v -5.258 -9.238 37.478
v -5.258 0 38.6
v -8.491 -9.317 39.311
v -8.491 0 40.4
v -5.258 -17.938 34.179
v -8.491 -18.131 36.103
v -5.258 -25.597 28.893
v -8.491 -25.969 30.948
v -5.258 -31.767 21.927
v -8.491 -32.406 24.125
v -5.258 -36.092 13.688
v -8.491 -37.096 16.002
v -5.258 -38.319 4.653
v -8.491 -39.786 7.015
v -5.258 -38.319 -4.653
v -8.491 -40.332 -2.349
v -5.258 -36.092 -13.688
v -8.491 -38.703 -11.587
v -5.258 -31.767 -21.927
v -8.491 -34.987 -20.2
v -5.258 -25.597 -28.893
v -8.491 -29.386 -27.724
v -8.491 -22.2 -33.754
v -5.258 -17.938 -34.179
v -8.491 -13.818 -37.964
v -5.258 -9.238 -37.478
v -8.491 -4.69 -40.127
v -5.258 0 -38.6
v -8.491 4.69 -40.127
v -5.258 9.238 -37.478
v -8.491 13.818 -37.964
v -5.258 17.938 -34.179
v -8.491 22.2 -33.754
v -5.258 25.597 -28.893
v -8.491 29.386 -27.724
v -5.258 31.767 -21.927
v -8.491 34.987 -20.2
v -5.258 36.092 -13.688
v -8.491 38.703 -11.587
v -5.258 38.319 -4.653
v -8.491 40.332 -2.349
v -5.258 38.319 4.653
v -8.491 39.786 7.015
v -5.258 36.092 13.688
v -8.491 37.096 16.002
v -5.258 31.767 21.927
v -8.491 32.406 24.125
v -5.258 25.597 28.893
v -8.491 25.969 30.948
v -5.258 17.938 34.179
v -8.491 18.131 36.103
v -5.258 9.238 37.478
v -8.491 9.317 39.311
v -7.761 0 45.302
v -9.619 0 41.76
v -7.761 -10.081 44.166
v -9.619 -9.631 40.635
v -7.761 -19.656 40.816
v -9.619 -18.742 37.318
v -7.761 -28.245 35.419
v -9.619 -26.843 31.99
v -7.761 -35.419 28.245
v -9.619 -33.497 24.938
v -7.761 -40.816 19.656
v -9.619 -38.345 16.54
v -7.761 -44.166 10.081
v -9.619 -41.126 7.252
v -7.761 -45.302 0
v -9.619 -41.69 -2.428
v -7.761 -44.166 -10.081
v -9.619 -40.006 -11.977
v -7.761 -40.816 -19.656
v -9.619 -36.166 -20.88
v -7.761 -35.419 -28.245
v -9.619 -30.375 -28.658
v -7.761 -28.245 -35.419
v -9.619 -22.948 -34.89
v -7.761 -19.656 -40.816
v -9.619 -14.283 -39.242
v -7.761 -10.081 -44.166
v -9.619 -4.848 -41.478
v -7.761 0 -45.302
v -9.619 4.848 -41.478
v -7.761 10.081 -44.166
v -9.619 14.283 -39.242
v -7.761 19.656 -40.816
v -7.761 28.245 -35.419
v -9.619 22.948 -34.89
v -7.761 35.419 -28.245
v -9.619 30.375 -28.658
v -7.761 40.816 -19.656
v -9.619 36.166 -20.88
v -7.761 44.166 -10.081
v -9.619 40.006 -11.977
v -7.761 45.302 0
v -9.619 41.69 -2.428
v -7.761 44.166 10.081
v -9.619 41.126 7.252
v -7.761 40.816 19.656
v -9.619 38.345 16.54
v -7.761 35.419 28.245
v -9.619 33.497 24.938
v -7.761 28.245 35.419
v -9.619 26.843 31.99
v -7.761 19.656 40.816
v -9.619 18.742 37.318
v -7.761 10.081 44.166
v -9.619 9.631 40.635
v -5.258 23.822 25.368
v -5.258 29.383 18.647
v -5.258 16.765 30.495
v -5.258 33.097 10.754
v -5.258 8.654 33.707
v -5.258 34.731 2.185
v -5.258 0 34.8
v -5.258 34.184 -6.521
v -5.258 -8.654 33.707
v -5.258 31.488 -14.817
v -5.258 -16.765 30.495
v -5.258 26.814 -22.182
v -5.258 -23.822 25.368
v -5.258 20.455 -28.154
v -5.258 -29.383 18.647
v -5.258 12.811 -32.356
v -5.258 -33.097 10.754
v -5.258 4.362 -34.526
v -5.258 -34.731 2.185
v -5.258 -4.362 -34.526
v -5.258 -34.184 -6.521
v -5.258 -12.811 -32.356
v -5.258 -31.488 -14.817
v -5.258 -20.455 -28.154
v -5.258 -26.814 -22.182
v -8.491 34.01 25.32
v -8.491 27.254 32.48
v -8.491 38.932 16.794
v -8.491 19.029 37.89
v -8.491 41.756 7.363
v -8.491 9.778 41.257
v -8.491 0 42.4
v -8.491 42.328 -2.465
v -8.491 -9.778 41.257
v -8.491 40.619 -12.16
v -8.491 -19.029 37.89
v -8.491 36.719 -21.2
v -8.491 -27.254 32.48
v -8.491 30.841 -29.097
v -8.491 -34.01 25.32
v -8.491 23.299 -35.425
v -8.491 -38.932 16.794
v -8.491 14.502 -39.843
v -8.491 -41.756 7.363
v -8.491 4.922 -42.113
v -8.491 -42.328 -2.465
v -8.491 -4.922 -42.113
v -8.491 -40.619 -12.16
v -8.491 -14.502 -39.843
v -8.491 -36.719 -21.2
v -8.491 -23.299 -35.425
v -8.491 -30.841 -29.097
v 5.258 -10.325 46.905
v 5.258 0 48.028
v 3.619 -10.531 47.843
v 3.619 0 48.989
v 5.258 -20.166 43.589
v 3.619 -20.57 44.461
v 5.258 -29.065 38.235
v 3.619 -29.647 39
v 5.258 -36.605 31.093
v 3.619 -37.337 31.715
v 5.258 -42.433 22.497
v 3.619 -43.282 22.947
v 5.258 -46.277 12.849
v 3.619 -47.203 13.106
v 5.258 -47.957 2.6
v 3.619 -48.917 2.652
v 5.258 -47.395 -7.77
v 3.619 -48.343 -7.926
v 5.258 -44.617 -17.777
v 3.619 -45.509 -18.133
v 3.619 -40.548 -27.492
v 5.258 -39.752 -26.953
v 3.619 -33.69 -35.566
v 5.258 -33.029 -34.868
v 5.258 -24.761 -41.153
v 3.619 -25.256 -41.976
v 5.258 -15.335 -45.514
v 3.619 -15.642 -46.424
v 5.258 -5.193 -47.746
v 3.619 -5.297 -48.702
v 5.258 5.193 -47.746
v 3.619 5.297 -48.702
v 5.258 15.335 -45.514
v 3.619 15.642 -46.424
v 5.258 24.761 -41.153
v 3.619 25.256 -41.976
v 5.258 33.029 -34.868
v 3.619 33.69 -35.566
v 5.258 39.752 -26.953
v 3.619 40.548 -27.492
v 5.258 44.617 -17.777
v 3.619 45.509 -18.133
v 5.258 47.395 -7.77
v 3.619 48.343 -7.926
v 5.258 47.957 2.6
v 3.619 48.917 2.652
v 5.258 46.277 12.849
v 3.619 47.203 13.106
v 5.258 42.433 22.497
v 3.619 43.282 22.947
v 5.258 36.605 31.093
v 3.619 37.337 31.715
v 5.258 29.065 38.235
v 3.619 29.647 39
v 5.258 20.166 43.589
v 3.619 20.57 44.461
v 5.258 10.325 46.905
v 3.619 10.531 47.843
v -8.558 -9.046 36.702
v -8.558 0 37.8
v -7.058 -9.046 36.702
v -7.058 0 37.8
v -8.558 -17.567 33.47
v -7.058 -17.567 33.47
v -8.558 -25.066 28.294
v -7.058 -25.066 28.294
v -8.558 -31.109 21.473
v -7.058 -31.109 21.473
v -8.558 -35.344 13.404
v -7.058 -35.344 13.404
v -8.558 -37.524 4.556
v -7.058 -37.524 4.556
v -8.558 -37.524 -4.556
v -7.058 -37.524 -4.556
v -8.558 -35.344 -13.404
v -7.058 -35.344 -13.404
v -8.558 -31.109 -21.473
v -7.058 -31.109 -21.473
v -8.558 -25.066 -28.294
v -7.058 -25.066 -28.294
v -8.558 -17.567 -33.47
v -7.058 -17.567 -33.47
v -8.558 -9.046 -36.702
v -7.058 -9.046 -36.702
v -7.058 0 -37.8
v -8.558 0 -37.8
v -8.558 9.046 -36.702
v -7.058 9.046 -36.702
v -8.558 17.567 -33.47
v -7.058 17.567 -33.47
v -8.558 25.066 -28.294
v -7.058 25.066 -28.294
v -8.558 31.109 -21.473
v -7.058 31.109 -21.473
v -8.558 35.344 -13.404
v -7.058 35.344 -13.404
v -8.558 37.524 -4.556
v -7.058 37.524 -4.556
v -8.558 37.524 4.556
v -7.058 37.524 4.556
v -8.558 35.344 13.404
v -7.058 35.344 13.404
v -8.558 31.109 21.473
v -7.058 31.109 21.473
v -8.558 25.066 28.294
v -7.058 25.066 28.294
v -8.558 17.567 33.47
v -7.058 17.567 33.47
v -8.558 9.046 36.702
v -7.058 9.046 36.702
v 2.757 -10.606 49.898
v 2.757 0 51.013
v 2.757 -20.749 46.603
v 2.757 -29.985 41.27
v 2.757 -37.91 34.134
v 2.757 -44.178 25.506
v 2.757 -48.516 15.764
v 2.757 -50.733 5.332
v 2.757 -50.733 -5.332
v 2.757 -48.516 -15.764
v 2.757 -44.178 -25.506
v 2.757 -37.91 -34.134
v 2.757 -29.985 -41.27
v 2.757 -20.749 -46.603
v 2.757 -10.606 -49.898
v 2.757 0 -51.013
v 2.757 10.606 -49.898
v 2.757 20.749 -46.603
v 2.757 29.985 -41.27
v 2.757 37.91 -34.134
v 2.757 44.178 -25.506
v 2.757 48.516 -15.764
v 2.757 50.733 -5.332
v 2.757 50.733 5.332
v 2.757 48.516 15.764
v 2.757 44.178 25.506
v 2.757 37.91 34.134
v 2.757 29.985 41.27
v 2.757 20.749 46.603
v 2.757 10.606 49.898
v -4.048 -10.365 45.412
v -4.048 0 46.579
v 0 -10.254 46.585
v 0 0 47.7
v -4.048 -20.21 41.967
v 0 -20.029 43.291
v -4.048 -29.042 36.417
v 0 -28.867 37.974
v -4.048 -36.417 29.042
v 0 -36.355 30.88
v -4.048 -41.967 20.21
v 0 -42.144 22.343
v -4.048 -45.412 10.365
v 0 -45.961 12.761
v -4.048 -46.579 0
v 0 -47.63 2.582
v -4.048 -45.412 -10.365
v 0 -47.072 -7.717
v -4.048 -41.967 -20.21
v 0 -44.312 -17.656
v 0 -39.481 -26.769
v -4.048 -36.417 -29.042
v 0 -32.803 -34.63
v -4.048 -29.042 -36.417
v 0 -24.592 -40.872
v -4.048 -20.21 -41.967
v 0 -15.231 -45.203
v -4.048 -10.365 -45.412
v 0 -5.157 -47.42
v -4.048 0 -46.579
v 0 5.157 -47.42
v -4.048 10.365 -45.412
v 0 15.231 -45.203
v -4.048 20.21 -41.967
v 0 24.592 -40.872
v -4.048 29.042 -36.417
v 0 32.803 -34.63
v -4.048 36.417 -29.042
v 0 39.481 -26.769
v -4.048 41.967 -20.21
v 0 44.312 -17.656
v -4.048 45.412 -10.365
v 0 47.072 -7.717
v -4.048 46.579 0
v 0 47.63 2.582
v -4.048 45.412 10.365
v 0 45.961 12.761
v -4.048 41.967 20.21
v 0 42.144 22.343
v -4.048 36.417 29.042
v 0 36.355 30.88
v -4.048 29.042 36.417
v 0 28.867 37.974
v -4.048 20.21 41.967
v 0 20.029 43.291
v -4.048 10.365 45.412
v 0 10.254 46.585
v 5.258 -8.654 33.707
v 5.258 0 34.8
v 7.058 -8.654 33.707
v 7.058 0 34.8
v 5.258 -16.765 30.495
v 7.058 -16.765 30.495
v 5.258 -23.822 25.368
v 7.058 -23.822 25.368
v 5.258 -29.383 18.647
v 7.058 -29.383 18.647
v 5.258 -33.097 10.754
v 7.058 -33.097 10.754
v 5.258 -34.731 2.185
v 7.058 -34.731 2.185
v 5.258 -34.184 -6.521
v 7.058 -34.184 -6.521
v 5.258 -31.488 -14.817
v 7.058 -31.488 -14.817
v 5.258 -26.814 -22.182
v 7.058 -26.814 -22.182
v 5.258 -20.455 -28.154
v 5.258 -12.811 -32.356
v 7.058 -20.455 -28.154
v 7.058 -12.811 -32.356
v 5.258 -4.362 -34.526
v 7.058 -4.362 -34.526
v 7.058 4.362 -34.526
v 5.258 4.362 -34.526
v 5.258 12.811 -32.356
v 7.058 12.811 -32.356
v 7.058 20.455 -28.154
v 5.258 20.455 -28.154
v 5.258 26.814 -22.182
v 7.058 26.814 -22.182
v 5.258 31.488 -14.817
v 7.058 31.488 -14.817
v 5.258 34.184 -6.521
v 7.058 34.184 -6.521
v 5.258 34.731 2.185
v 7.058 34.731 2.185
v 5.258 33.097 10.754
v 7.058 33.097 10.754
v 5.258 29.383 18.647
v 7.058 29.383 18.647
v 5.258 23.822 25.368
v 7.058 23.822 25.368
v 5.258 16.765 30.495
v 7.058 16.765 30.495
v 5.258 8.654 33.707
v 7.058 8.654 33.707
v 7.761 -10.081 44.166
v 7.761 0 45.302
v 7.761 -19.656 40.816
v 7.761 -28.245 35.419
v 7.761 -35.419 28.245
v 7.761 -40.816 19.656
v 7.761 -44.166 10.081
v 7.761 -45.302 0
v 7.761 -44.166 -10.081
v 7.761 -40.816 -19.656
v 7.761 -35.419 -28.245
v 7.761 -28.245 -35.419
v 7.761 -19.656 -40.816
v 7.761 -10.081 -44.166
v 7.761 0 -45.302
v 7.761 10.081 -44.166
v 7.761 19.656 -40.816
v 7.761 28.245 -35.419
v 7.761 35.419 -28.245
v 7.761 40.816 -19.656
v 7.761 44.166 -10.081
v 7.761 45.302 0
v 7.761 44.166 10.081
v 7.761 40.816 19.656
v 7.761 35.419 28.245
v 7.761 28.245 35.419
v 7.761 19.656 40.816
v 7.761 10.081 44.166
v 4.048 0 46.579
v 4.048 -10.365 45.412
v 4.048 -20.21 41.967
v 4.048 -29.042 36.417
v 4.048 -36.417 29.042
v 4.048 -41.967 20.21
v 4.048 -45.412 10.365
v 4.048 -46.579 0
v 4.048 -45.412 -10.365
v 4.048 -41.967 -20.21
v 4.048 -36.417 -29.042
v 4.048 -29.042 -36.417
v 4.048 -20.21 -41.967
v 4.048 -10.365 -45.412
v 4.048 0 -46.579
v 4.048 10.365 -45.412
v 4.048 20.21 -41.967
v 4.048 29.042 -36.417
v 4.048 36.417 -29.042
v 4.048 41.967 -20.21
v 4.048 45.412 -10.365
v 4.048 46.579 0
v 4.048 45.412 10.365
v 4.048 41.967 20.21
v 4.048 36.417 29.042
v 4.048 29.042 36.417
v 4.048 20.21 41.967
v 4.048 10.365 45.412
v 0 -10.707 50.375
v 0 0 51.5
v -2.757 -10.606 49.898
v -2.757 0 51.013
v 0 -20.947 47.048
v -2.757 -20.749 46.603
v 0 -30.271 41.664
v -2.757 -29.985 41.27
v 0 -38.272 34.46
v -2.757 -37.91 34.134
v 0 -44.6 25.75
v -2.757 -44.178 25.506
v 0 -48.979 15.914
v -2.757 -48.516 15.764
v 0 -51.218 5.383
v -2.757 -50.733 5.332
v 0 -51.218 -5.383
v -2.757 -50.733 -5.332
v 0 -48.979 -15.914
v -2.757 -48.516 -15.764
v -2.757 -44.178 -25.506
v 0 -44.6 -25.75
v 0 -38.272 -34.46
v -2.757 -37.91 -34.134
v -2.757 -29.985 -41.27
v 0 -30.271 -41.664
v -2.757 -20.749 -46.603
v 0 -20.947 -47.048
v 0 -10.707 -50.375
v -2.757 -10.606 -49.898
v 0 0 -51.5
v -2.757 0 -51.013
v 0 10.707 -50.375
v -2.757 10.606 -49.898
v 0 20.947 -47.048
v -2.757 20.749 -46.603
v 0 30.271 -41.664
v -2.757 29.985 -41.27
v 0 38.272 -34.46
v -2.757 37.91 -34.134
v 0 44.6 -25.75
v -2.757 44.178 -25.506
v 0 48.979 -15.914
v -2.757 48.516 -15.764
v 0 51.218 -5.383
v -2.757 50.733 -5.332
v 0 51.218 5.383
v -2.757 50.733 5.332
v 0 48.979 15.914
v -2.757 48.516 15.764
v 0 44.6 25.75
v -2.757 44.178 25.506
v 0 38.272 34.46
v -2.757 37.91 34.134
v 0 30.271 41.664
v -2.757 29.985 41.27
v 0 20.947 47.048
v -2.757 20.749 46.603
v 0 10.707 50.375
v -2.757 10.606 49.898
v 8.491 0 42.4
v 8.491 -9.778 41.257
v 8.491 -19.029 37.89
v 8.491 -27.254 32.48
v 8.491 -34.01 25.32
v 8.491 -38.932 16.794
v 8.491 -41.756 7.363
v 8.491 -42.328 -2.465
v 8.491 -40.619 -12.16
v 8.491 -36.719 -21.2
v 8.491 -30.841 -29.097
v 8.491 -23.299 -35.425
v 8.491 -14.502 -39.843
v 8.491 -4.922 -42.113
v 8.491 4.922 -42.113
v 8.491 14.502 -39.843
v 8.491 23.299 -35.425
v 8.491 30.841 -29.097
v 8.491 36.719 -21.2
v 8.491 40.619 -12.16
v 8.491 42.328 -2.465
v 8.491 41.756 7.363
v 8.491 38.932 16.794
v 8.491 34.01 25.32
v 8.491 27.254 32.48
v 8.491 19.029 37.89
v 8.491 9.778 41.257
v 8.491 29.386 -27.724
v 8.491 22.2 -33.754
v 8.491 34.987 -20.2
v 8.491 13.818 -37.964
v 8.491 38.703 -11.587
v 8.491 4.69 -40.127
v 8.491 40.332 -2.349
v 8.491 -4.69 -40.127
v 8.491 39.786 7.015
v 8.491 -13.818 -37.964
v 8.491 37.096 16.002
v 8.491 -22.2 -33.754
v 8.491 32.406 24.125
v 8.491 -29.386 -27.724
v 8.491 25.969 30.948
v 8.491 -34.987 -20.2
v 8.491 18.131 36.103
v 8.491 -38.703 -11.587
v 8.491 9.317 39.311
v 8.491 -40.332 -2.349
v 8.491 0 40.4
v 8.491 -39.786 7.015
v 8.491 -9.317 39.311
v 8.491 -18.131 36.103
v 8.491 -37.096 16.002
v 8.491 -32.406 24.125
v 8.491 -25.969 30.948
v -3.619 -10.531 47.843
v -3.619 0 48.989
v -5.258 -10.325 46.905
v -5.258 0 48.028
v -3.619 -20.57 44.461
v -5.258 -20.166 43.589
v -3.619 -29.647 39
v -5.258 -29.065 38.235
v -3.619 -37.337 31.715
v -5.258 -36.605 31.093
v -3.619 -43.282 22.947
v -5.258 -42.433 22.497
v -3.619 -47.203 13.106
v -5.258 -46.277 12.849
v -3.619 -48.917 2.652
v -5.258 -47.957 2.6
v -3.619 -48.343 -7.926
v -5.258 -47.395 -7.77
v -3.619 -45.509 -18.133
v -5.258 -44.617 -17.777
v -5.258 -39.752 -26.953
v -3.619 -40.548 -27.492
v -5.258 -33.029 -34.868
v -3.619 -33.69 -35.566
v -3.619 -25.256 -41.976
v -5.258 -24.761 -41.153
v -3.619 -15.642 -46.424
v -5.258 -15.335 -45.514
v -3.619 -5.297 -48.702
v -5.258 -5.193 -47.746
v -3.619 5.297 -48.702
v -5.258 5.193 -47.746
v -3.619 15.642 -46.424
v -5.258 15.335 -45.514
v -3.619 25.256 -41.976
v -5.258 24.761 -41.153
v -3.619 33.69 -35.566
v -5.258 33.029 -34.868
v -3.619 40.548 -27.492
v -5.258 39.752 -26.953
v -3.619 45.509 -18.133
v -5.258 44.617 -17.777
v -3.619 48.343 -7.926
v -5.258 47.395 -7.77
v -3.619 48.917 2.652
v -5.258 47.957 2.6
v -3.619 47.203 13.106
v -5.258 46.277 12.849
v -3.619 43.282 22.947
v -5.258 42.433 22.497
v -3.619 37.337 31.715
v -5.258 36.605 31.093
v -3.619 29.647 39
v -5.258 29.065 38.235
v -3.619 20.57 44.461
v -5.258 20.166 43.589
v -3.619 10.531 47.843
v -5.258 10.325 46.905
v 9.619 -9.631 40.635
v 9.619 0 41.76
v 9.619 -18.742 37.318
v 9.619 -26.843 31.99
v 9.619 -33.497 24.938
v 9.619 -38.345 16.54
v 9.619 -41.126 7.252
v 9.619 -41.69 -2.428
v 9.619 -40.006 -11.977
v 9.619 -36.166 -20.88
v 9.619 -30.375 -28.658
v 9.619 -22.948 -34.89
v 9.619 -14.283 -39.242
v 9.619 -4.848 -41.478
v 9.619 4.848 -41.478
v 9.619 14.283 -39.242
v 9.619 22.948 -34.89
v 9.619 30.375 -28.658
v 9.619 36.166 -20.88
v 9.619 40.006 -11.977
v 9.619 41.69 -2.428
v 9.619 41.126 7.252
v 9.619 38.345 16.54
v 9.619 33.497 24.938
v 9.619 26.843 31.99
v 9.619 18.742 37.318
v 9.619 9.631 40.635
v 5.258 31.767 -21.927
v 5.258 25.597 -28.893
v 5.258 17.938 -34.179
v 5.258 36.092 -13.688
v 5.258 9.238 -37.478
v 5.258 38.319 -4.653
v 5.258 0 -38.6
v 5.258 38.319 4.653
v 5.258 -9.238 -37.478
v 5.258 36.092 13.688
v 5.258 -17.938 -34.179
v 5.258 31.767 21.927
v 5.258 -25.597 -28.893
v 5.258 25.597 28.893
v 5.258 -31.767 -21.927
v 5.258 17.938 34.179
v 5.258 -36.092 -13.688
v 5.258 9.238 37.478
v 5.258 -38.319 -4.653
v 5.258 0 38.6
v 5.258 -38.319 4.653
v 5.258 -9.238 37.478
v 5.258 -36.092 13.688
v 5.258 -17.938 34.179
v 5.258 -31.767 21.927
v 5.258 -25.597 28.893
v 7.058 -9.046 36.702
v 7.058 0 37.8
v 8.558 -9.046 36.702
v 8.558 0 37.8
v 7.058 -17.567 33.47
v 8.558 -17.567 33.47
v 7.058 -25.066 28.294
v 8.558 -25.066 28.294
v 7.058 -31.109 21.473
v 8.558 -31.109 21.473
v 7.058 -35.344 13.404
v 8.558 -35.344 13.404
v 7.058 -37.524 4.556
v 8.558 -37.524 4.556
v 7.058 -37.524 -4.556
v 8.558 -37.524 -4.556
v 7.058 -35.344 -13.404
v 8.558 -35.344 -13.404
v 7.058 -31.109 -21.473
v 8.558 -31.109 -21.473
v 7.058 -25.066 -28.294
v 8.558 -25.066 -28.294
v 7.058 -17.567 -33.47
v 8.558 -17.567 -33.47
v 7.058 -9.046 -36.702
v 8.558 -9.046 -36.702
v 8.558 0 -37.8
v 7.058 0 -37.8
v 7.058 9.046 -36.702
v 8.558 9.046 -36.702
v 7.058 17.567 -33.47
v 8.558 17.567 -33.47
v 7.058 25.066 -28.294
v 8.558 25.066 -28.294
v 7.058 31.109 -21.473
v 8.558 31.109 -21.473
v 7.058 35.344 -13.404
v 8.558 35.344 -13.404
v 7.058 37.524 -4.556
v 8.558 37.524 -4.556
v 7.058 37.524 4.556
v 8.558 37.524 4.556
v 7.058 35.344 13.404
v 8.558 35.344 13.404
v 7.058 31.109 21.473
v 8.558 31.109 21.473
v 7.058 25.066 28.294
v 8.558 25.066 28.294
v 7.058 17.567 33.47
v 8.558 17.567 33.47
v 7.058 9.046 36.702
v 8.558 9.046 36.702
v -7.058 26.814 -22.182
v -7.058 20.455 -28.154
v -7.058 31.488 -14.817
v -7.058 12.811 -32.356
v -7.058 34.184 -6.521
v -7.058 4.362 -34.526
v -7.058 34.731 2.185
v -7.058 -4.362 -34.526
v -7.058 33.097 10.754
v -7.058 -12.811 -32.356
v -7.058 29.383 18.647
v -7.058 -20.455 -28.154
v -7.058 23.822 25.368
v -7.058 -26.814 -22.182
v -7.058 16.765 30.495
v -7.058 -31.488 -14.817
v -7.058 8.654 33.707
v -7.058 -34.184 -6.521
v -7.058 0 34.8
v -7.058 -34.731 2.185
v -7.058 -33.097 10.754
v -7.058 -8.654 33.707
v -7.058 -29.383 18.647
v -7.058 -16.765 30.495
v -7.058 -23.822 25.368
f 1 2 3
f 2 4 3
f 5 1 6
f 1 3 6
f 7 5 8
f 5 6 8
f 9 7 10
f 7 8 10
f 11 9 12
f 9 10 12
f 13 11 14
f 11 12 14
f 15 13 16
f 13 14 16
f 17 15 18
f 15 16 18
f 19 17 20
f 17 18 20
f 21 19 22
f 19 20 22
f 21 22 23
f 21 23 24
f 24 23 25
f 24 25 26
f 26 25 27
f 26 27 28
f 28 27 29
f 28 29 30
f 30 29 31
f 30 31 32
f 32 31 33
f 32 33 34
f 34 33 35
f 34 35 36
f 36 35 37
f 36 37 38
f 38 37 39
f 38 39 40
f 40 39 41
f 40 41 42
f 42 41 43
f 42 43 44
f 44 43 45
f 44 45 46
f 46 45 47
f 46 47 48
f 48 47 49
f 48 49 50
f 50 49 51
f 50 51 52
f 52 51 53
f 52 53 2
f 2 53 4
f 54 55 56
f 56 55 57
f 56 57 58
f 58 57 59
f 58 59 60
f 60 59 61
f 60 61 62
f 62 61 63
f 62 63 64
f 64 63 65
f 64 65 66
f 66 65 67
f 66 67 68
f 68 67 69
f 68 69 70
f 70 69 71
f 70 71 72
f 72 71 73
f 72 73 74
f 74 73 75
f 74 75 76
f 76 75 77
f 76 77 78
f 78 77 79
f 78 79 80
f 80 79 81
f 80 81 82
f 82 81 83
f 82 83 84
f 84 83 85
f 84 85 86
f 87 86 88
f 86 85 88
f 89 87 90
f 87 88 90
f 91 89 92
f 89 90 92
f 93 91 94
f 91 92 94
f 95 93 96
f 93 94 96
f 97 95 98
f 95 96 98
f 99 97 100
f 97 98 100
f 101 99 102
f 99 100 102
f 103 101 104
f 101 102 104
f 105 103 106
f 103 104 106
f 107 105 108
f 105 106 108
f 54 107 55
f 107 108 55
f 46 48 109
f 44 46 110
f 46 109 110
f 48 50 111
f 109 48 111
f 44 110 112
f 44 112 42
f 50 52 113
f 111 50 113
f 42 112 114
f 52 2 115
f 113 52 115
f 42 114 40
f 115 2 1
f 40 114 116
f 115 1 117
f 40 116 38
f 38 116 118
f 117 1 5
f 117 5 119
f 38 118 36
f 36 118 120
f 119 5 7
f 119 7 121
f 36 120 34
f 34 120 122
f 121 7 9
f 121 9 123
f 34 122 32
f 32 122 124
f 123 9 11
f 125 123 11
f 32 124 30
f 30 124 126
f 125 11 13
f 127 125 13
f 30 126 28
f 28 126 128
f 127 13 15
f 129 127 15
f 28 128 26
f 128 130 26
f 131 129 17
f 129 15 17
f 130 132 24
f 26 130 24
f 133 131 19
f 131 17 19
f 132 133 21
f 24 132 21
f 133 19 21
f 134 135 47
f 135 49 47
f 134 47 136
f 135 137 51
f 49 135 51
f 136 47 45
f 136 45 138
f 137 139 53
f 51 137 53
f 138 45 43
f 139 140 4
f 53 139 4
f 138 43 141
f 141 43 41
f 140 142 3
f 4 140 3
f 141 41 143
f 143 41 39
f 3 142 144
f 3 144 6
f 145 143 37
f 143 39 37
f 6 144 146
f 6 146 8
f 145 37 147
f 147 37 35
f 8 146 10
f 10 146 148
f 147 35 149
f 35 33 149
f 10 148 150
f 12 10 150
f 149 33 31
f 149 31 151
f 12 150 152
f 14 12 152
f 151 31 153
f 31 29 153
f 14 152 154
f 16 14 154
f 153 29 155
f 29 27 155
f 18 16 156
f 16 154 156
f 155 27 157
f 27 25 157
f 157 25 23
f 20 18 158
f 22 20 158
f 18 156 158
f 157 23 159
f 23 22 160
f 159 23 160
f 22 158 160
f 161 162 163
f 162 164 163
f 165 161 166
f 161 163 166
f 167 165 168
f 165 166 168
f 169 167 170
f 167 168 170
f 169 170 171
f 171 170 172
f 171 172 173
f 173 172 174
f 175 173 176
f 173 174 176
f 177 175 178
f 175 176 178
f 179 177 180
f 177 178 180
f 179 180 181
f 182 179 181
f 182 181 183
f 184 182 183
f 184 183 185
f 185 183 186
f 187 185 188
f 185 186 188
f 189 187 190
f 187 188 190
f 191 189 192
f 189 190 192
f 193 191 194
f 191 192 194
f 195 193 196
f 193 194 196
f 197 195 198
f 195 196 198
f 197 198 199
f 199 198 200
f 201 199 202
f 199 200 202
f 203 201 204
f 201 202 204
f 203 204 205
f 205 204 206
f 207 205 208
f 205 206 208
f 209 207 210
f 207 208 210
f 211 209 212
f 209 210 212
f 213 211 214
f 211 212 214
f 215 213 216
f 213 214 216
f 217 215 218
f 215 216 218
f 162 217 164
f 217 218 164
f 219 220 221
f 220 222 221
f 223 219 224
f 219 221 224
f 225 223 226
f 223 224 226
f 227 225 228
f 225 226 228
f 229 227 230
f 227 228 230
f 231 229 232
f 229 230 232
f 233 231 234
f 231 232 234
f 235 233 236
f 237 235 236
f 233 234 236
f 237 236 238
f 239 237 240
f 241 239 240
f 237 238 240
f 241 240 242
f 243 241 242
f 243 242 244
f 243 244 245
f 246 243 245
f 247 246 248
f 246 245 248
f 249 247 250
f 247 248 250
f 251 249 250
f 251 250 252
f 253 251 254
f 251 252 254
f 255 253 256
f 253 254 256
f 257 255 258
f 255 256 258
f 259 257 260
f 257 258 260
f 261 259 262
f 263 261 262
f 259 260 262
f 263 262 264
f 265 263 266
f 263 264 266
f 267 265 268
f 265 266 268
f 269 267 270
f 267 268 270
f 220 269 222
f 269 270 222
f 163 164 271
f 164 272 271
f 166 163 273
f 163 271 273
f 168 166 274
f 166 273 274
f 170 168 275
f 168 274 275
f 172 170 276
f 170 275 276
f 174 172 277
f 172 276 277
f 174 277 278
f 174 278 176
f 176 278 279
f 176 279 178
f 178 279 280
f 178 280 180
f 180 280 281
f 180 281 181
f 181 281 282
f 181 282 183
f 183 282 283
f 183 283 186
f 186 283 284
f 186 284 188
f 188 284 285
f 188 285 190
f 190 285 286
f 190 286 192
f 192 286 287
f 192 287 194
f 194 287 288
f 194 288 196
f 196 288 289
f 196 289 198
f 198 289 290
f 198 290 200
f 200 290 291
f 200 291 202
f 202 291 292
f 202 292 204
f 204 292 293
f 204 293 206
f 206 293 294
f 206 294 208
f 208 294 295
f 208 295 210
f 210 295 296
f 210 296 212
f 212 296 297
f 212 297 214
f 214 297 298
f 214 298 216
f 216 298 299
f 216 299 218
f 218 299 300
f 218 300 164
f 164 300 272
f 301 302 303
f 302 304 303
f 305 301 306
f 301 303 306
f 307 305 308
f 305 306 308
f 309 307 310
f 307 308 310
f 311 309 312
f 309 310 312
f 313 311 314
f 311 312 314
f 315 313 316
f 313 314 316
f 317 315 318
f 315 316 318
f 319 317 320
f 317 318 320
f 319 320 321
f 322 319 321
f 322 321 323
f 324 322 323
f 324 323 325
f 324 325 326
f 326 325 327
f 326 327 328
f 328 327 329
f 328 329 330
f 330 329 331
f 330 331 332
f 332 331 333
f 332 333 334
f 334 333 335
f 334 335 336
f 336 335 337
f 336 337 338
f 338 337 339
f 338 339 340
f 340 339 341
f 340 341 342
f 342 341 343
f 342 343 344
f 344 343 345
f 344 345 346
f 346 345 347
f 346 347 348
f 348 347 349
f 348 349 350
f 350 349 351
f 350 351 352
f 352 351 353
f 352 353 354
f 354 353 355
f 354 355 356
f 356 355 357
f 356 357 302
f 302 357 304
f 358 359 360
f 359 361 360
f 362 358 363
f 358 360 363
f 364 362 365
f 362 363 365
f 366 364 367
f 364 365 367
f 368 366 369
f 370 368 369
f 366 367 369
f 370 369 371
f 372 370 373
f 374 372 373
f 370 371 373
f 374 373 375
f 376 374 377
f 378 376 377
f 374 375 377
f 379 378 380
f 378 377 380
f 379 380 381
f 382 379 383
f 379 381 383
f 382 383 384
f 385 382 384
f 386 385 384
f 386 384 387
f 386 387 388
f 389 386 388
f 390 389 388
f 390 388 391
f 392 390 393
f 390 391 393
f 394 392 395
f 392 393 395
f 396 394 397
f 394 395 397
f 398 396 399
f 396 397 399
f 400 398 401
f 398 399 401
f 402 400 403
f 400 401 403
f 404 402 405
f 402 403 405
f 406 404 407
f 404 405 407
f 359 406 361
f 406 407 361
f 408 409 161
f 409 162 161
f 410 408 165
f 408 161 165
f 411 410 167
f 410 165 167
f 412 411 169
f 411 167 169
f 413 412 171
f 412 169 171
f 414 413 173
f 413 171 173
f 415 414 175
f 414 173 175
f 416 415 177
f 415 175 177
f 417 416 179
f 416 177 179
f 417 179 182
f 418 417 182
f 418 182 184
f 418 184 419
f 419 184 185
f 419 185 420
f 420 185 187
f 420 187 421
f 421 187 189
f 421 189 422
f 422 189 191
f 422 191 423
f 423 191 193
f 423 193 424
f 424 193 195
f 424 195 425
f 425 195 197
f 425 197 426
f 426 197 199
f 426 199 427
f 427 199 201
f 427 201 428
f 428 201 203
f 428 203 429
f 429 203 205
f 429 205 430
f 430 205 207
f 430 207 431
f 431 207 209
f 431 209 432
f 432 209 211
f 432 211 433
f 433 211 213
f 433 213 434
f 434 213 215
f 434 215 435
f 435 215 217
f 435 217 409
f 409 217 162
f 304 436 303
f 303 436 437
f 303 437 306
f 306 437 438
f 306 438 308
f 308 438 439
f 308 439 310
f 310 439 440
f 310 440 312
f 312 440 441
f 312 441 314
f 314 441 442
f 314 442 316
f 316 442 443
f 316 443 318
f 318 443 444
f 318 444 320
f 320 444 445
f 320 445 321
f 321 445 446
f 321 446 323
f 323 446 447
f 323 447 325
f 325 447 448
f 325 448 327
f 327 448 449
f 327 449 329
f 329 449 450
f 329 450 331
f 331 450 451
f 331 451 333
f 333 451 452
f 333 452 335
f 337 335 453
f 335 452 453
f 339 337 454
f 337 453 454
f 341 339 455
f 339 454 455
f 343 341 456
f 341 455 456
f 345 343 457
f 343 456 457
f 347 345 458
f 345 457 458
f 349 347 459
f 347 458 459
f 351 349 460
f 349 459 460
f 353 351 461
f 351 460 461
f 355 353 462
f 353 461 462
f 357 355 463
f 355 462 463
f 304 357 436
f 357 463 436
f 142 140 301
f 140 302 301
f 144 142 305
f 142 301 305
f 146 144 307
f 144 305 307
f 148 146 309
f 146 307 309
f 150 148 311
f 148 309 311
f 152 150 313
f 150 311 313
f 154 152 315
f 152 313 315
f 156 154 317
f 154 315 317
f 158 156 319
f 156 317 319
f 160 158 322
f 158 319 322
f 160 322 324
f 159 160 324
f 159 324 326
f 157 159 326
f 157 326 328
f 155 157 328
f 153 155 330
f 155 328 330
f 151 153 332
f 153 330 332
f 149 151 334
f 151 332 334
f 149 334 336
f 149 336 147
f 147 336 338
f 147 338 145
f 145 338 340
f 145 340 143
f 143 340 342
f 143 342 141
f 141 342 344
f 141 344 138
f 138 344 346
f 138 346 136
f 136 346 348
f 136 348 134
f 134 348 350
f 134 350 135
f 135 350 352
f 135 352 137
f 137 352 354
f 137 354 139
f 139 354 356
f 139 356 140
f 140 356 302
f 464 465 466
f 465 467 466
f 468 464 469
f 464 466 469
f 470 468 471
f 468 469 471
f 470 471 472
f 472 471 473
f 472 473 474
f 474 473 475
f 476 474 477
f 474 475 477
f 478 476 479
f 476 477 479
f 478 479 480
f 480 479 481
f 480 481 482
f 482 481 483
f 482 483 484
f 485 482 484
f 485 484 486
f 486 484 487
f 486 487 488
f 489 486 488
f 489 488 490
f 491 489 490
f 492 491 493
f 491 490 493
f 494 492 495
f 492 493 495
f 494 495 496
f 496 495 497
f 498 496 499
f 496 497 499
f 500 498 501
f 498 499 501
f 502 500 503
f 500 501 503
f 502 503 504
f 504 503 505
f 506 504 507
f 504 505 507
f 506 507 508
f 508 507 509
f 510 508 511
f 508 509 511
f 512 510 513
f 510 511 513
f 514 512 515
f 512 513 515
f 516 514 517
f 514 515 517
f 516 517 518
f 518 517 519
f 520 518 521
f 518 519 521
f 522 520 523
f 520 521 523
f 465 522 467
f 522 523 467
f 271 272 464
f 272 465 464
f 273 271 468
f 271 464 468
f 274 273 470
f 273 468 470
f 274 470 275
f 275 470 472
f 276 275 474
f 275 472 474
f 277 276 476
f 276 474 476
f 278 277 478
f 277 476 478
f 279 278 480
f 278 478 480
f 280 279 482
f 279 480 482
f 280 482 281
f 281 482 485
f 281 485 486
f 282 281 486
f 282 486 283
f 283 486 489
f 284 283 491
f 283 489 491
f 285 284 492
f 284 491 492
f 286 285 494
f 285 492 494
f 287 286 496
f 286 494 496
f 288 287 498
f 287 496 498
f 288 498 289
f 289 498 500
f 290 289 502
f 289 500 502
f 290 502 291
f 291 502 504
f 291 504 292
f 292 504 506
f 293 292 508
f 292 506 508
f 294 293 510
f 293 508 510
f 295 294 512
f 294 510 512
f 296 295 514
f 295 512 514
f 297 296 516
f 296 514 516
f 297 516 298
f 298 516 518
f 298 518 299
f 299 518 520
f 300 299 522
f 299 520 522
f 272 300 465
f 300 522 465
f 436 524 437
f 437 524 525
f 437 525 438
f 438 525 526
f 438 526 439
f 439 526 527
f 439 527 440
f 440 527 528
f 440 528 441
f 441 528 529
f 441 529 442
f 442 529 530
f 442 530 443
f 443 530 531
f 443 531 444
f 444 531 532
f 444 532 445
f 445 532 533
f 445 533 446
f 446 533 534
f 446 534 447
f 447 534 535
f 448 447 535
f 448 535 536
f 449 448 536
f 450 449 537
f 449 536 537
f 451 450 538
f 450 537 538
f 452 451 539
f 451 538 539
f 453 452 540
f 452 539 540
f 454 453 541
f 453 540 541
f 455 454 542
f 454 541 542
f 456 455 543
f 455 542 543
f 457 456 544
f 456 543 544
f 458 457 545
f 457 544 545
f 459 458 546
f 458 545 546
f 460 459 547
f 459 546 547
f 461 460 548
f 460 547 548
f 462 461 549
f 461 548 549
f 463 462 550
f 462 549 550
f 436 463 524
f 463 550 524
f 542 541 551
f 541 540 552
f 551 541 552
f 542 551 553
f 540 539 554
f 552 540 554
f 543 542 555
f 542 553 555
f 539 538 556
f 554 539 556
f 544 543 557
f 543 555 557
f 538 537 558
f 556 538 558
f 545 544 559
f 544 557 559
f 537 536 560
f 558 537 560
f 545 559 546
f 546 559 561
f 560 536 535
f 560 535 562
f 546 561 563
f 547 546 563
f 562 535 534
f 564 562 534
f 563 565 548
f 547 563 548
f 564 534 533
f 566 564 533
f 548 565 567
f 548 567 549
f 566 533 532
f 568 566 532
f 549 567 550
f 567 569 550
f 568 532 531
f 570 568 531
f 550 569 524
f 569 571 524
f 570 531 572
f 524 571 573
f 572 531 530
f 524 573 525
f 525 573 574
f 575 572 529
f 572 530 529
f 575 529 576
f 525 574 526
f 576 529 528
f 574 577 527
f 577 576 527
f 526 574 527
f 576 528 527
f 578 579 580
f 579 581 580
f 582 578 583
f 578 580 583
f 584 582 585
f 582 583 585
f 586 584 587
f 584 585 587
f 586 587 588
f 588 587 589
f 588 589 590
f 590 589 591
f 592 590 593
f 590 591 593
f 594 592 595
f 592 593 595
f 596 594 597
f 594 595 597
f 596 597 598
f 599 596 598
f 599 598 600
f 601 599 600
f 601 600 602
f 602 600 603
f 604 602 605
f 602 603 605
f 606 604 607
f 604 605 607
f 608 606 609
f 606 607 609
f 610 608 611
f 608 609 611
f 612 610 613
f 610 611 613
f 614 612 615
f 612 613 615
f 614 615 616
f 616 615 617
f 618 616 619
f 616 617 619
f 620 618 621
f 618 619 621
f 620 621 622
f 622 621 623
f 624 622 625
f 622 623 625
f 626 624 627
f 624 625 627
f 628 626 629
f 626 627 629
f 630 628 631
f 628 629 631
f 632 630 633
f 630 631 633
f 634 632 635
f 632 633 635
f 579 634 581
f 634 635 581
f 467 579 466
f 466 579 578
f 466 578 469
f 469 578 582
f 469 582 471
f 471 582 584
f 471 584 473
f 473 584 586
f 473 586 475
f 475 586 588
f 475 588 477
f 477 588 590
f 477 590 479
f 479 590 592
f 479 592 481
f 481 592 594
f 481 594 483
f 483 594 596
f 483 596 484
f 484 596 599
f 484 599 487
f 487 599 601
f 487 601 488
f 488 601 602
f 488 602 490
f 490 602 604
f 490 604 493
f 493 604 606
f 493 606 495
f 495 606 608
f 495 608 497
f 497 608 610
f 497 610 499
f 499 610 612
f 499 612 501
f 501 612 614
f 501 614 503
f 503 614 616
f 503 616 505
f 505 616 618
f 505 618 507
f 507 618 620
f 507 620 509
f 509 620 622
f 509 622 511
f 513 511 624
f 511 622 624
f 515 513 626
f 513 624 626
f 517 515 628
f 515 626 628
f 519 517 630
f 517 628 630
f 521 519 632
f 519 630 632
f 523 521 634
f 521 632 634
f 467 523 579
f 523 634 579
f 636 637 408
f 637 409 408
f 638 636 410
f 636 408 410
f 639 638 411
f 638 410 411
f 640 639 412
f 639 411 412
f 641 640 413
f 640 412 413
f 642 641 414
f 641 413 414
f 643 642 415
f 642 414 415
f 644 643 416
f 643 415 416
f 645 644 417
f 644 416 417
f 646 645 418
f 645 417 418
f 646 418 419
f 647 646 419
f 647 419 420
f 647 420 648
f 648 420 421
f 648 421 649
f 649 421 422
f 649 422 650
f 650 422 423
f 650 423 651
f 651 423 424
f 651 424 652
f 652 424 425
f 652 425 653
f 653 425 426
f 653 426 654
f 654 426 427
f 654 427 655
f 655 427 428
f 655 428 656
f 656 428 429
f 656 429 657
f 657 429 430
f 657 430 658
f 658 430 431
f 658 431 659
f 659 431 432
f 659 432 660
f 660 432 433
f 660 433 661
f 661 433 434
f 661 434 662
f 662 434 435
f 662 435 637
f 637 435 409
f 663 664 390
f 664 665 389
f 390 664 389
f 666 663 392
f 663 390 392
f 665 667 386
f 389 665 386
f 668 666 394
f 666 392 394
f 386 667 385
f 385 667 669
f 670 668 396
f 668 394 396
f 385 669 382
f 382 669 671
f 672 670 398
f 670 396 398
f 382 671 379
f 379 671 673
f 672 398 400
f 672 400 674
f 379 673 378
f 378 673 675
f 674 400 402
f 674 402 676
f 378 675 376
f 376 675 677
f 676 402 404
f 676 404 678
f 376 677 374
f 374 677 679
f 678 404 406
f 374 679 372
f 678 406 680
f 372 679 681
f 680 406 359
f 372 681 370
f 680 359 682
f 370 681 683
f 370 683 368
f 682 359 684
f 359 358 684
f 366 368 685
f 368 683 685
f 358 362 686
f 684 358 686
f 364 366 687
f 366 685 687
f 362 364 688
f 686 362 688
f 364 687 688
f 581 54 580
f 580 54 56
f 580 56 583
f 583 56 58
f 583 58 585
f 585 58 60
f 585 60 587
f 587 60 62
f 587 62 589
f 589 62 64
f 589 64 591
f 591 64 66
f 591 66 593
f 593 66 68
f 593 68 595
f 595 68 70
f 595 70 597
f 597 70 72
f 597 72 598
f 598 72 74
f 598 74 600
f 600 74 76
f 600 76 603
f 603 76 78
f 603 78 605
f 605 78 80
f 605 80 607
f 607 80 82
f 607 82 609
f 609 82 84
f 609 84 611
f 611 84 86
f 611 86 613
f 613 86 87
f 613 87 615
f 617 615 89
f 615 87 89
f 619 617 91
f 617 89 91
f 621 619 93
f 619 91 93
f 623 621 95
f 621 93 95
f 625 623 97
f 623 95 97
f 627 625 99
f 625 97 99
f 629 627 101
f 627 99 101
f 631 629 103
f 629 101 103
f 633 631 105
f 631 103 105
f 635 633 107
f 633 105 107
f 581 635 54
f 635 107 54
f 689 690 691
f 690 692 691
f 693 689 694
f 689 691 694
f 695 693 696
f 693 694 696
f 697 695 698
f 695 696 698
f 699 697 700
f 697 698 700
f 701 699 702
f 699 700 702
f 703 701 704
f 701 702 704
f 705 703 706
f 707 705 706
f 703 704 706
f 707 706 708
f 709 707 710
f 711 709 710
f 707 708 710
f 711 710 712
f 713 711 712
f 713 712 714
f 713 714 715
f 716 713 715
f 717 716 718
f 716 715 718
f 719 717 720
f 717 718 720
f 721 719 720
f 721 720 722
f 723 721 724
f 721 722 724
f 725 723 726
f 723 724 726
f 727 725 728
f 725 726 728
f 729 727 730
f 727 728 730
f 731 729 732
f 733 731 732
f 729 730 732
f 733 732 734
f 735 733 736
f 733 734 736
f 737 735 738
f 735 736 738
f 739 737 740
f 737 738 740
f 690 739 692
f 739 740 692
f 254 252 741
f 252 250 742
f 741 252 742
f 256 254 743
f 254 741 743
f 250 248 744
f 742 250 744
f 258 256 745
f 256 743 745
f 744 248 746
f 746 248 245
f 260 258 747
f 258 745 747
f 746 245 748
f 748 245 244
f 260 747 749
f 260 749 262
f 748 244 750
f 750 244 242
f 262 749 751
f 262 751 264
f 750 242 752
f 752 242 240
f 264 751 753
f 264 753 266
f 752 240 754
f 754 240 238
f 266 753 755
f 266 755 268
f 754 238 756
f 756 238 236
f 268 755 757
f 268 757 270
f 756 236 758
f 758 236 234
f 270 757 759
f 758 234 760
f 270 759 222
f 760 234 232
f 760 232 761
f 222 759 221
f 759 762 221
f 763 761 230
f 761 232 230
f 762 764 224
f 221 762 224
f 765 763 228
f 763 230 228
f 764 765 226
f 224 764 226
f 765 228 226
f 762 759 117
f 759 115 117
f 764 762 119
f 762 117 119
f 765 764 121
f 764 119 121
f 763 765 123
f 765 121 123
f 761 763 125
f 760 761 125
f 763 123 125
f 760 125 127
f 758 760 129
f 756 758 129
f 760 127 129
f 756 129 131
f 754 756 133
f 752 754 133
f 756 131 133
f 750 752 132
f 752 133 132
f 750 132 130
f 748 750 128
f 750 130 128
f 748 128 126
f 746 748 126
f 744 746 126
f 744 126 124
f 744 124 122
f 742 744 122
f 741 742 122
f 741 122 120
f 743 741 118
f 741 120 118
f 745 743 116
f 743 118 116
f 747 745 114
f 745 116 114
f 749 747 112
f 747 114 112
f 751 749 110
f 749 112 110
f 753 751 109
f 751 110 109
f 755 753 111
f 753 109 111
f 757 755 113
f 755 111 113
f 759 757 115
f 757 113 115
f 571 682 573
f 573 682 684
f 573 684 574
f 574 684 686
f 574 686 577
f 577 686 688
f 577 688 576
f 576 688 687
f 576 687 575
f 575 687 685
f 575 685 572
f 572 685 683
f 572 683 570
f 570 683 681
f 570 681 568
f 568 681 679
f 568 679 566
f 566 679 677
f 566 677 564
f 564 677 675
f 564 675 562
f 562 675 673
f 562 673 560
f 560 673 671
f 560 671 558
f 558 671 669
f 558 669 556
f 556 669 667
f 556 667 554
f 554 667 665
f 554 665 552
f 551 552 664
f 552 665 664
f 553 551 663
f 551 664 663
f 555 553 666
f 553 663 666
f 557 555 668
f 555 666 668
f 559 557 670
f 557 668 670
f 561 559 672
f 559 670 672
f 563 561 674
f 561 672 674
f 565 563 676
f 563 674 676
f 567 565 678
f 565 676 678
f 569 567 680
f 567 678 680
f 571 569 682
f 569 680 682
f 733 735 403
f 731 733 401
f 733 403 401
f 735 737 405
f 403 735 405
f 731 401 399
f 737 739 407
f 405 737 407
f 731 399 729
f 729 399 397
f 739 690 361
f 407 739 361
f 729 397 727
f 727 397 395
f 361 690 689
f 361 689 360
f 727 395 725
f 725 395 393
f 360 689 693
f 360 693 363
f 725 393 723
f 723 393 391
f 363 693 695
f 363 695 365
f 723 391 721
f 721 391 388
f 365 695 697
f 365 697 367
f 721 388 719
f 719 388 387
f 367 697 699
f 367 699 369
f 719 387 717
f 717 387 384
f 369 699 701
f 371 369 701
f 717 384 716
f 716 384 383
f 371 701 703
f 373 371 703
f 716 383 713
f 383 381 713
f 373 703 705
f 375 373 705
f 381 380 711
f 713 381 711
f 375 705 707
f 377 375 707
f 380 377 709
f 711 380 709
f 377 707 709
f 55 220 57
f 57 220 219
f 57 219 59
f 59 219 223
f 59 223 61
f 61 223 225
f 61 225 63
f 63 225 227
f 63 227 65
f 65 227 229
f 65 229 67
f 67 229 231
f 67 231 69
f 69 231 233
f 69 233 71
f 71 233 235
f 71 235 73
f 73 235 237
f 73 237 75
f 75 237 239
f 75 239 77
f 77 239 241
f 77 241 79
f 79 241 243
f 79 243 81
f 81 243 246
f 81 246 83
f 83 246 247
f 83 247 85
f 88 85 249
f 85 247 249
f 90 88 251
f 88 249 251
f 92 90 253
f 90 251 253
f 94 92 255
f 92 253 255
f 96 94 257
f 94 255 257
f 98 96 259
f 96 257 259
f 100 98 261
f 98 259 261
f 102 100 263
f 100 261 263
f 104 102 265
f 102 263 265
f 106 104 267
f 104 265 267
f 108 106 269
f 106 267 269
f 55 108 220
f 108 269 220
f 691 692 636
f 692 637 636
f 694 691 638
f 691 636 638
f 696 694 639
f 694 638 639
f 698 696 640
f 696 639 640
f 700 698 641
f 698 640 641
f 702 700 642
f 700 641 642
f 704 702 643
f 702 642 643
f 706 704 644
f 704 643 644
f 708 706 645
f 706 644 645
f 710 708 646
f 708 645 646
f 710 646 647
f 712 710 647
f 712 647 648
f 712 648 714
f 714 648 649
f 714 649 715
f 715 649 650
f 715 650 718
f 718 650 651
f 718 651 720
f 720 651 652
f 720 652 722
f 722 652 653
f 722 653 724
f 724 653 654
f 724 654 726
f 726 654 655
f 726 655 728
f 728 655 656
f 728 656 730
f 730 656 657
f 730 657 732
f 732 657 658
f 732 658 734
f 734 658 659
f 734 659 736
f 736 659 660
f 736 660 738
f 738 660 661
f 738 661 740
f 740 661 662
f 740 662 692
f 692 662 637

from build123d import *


with BuildPart() as part:
    # Front → Revolve1 (revolve)
    with BuildSketch(Plane.XY, mode=Mode.PRIVATE) as revolve1_sk:
        Polygon((0, 47.7), (4.04774101, 46.579378424), (8.49102763, 42.4), (8.49102763, 40.4), (5.258381655, 38.6), (5.258381655, 34.8), (7.058381655, 34.8), (7.058381655, 37.8), (8.558381655, 37.8), (9.619339829, 41.760349449), (7.760518893, 45.302211209), (5.258381655, 48.027887133), (3.61929083, 48.988814429), (2.757308273, 51.012915728), (0, 51.5), (-2.757308273, 51.012915728), (-3.61929083, 48.988814429), (-5.258381655, 48.027887133), (-7.760518893, 45.302211209), (-9.619339829, 41.760349449), (-8.558381655, 37.8), (-7.058381655, 37.8), (-7.058381655, 34.8), (-5.258381655, 34.8), (-5.258381655, 38.6), (-8.49102763, 40.4), (-8.49102763, 42.4), (-4.04774101, 46.579378424), align=None)
    revolve(revolve1_sk.sketch.rotate(Axis((0, 0, 0), (1, 0, 0)), 90), axis=Axis((0, 0, 0), (1, 0, 0)))


solid = part.part
